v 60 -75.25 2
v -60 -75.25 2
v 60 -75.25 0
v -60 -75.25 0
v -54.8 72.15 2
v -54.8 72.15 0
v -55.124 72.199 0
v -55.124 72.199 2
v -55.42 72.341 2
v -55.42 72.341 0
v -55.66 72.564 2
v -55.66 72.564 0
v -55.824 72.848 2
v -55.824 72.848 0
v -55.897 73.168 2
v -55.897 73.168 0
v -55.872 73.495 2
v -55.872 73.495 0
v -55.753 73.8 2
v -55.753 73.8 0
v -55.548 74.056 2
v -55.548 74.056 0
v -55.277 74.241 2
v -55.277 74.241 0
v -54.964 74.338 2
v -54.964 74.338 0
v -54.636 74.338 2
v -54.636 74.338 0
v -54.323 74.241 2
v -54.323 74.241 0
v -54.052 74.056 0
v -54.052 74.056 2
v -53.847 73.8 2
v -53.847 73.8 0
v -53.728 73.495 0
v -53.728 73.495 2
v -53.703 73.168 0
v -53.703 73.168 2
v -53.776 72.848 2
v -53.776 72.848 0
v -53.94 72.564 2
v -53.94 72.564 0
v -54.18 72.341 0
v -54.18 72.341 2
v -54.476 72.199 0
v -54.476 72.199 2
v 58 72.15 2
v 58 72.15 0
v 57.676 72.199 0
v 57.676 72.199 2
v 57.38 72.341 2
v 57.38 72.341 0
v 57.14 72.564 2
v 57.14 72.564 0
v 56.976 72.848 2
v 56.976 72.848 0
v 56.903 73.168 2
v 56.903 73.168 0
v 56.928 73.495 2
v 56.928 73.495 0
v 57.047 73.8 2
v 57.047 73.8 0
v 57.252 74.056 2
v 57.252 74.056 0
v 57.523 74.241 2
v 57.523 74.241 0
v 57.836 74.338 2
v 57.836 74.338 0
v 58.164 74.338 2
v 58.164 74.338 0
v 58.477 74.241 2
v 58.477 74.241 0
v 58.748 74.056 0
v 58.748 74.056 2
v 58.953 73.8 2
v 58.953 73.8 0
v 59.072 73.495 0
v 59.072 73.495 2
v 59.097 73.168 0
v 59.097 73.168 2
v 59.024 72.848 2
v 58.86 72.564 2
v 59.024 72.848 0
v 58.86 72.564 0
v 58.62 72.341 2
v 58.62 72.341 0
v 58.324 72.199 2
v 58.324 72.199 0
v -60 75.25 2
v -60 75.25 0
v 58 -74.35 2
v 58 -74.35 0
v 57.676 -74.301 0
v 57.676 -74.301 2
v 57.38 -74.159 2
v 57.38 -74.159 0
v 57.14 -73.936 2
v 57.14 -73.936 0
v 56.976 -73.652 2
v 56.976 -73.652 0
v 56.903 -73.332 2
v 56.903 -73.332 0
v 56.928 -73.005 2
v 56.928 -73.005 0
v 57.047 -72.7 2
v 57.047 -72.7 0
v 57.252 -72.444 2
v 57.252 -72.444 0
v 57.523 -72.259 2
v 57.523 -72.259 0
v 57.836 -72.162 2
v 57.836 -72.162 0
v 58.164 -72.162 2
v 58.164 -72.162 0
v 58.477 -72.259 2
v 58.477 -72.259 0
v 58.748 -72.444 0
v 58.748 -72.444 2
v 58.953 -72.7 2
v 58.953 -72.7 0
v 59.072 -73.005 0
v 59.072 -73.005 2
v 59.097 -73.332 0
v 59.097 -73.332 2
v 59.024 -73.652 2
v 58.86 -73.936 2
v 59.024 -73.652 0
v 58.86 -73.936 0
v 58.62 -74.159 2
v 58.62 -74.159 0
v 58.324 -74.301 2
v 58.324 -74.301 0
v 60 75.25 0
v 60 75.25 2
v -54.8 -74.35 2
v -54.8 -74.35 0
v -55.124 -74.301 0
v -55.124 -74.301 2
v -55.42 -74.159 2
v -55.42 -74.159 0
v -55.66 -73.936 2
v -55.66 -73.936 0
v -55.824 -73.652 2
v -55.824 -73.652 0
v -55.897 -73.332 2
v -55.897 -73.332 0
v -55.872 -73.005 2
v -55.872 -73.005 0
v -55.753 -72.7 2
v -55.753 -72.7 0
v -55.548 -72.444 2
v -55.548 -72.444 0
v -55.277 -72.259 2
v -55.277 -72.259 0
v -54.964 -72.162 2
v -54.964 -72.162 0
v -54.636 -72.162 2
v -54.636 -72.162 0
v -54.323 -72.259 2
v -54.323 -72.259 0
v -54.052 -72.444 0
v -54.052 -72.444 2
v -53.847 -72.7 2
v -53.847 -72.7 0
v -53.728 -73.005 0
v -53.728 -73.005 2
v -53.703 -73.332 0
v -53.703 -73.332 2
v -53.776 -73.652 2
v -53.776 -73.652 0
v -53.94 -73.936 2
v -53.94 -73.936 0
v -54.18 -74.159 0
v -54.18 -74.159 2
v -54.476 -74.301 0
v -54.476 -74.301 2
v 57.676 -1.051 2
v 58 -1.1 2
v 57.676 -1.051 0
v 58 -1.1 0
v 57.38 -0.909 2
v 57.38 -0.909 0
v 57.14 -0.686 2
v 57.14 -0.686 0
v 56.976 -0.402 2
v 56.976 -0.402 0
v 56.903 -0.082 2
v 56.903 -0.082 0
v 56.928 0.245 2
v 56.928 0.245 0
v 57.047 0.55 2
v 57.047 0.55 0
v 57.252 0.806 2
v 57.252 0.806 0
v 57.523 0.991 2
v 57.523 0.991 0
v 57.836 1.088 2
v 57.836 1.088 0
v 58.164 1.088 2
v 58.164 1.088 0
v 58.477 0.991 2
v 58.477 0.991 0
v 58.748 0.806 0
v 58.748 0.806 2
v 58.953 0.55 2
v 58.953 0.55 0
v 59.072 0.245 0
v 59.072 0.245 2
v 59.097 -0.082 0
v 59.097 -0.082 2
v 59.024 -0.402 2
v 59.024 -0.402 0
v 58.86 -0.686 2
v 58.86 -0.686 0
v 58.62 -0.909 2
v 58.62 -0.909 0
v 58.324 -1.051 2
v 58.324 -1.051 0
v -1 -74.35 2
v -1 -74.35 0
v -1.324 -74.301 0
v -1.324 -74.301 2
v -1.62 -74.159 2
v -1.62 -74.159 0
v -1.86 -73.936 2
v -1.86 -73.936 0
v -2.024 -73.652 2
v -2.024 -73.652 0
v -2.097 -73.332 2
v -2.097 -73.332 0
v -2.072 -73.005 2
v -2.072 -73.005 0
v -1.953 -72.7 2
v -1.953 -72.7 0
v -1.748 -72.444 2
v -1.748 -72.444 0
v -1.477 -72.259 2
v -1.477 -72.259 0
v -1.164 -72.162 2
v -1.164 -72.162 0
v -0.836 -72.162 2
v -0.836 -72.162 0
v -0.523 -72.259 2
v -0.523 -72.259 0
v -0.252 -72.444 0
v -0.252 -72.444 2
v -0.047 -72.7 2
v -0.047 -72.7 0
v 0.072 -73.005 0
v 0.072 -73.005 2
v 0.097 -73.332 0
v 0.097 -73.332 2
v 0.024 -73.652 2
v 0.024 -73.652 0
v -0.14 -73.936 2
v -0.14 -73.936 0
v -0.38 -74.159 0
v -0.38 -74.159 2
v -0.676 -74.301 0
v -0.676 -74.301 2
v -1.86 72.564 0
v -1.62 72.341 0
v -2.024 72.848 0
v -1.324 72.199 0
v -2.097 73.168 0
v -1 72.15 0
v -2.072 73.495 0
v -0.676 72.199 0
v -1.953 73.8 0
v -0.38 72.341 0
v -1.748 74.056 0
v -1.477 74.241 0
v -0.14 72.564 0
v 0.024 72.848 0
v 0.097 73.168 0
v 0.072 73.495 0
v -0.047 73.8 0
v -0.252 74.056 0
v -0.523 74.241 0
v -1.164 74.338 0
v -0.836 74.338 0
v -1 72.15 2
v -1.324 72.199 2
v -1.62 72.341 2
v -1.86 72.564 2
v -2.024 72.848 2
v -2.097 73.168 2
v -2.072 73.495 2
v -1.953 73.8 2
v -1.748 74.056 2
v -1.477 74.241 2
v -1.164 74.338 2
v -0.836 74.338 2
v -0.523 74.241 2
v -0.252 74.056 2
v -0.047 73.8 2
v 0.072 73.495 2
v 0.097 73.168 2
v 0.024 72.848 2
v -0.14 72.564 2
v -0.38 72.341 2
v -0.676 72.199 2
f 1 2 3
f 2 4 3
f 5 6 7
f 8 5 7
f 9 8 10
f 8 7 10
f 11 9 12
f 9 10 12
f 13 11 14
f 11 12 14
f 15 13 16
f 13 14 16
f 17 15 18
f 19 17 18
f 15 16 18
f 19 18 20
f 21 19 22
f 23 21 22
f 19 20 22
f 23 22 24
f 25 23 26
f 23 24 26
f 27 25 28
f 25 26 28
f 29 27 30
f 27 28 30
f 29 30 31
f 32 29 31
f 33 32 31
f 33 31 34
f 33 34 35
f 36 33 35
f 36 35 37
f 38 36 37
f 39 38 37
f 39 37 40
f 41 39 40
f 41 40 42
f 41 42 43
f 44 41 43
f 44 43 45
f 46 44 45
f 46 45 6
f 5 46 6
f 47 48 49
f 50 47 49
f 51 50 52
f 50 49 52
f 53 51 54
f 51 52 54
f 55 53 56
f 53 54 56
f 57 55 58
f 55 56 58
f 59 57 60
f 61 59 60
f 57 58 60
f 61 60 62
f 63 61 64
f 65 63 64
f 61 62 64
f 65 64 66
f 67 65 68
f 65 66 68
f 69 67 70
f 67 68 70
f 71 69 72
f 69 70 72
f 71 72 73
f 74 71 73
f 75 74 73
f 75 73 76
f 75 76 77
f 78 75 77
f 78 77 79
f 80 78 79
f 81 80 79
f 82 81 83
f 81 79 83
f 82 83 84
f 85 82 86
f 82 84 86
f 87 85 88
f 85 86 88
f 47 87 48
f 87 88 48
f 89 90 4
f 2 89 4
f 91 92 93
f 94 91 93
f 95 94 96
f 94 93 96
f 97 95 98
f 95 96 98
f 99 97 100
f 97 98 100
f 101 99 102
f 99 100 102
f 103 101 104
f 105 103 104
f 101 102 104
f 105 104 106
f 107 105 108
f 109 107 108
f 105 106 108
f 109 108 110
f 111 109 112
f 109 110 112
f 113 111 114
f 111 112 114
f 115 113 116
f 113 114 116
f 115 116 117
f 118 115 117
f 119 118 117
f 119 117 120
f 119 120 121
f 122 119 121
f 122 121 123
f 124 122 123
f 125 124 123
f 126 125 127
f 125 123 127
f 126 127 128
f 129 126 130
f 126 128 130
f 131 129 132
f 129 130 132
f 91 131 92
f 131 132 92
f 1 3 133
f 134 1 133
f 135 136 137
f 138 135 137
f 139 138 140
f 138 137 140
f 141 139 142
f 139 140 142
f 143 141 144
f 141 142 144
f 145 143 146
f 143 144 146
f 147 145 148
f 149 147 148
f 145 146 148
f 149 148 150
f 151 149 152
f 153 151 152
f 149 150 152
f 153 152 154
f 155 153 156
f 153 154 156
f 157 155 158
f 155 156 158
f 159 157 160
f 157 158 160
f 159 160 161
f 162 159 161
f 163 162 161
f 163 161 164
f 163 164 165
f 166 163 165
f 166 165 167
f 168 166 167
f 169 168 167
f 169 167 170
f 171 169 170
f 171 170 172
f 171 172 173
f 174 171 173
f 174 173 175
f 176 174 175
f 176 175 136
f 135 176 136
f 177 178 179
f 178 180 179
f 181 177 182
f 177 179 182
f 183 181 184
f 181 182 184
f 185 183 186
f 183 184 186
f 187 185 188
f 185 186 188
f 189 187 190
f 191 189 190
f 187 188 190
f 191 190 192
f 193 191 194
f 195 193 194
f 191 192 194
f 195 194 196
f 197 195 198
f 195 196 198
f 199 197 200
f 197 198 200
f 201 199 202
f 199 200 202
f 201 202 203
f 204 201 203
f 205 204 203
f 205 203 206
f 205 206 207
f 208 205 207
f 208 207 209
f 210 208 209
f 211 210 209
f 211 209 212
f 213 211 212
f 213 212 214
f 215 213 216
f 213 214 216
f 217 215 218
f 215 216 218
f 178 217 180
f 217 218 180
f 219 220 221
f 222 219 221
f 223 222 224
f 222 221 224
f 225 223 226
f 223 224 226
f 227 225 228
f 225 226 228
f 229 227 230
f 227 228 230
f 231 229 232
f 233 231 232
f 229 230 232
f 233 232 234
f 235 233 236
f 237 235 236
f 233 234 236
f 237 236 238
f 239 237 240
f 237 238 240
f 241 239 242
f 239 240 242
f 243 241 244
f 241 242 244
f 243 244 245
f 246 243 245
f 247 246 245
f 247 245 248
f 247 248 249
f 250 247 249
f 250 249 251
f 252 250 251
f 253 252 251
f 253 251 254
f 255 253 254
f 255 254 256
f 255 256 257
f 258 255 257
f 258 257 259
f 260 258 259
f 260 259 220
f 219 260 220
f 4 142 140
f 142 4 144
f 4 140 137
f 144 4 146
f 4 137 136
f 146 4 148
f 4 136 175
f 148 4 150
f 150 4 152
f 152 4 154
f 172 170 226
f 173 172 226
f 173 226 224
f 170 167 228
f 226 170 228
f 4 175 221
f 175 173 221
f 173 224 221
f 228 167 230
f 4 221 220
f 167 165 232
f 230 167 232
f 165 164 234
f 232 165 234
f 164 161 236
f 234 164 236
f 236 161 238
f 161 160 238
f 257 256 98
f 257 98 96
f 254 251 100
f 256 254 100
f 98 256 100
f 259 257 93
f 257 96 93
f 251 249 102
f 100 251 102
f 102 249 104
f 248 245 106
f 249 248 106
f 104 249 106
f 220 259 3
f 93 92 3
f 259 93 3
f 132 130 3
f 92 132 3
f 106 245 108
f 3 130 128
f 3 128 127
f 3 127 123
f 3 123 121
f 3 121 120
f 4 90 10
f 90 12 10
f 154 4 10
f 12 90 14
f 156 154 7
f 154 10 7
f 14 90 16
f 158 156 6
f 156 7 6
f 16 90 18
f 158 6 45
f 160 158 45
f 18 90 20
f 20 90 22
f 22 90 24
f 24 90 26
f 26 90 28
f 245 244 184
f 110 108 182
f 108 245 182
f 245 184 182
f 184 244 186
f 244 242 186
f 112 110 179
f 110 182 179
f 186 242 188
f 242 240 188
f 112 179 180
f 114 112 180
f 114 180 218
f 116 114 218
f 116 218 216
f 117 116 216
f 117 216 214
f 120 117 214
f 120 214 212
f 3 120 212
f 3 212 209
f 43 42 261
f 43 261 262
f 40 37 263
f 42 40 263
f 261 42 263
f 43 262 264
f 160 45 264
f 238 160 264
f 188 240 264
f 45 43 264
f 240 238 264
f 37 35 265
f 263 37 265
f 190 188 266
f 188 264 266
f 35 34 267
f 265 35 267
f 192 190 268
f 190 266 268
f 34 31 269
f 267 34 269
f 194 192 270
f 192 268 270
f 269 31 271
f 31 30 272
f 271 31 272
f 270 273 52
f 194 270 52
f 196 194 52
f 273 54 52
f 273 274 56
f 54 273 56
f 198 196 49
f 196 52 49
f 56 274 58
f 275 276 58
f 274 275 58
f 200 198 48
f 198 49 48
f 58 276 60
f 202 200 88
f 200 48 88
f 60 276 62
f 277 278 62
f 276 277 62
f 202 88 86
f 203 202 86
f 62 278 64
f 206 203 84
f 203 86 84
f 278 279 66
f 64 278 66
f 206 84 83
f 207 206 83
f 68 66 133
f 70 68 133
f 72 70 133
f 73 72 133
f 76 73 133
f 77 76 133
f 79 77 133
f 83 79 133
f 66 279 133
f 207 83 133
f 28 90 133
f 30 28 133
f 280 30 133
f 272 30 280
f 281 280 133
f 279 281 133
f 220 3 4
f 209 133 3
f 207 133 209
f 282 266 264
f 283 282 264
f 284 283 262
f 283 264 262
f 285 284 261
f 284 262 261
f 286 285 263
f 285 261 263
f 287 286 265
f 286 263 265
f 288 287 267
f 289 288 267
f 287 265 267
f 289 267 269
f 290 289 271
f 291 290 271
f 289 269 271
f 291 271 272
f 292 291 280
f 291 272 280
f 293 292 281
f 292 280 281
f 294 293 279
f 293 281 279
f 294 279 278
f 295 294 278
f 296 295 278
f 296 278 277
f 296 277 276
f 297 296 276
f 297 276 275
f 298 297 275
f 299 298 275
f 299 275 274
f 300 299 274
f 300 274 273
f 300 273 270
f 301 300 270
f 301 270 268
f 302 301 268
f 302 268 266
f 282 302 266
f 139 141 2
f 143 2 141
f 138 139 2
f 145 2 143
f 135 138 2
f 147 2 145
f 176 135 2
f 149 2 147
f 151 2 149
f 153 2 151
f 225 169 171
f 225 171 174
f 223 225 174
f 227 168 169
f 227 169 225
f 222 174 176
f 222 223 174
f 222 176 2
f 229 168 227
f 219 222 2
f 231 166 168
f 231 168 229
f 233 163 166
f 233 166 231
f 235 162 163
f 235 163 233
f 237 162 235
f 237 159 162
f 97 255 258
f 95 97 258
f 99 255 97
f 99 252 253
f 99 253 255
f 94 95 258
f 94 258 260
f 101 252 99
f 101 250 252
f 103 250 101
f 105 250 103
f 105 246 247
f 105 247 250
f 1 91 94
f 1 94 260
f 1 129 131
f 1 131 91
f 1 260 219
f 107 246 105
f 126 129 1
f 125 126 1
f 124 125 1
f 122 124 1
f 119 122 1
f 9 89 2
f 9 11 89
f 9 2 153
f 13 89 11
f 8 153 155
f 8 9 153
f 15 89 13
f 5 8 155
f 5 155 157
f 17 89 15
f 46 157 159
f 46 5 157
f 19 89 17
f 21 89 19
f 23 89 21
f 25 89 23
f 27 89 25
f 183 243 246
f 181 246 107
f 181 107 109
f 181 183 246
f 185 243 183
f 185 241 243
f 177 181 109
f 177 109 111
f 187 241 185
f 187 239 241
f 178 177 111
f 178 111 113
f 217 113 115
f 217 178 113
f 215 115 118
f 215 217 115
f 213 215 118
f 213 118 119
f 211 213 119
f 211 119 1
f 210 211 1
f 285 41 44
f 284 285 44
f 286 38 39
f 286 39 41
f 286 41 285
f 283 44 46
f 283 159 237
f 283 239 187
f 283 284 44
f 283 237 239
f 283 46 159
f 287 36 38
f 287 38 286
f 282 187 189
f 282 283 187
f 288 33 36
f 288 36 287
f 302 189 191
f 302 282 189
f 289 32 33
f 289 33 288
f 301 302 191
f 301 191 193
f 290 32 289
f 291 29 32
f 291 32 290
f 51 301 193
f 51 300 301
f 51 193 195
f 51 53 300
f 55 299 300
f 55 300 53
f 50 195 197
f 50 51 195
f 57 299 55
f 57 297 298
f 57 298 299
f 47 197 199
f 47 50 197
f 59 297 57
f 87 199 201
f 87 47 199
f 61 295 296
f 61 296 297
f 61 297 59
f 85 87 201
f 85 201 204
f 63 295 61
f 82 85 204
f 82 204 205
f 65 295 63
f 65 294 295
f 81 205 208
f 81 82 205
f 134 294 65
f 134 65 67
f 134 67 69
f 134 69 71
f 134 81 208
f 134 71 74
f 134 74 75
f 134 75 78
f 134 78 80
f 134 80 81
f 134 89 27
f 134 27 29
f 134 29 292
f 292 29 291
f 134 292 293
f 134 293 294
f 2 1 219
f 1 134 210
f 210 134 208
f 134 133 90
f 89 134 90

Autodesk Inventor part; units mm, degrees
ref_plane "YZ Plane" through (0, 0, 0) normal (1, 0, 0) x (0, 1, 0)
ref_plane "XZ Plane" through (0, 0, 0) normal (0, 1, 0) x (-1, 0, 0)
ref_plane "XY Plane" through (0, 0, 0) normal (0, 0, 1) x (1, 0, 0)
ref_plane "Work Plane1" through (0, 0, 0) normal (0, 0, 1) x (1, 0, 0)
sketch "Sketch1" plane through (0, 0, 0) normal (0, 0, 1) x (1, 0, 0)
  circle A0 centre (-1, 73.25) radius 1.05 projected
  circle A1 centre (-54.8, -73.25) radius 1.05 projected
  circle A2 centre (-54.8, 73.25) radius 1.05 projected
  circle A3 centre (-1, -73.25) radius 1.05 projected
  circle A4 centre (58, -73.25) radius 1.05 projected
  circle A5 centre (58, 0) radius 1.05 projected
  circle A6 centre (58, 73.25) radius 1.05 projected
  line L0 (-60, -75.25) -> (60, -75.25) projected
  line L1 (60, -75.25) -> (60, 75.25) projected
  line L2 (60, 75.25) -> (-60, 75.25) projected
  line L3 (-60, 75.25) -> (-60, 73.25) projected
  line L4 (-60, 73.25) -> (-56.8, 73.25) projected
  line L5 (-56.8, 71.25) -> (-56.8, 73.25) projected
  line L6 (-54.8, 71.25) -> (-56.8, 71.25) projected
  arc A7 (-54.8, 71.25) -> (-52.8, 73.25) centre (-54.8, 73.25) ccw projected
  line L7 (-52.8, 73.25) -> (-3, 73.25) projected
  arc A8 (-3, 73.25) -> (1, 73.25) centre (-1, 73.25) ccw projected
  line L8 (1, 73.25) -> (56, 73.25) projected
  arc A9 (56, 73.25) -> (58, 71.25) centre (58, 73.25) ccw projected
  line L9 (58, 71.25) -> (58, 2) projected
  arc A10 (58, 2) -> (58, -2) centre (58, 0) ccw projected
  line L10 (58, -2) -> (58, -71.25) projected
  arc A11 (58, -71.25) -> (56, -73.25) centre (58, -73.25) ccw projected
  line L11 (56, -73.25) -> (1, -73.25) projected
  arc A12 (1, -73.25) -> (-3, -73.25) centre (-1, -73.25) ccw projected
  line L12 (-3, -73.25) -> (-52.8, -73.25) projected
  arc A13 (-52.8, -73.25) -> (-54.8, -71.25) centre (-54.8, -73.25) ccw projected
  line L13 (-56.8, -71.25) -> (-54.8, -71.25) projected
  line L14 (-56.8, -73.25) -> (-56.8, -71.25) projected
  line L15 (-56.8, -73.25) -> (-60, -73.25) projected
  line L16 (-60, -73.25) -> (-60, -75.25) projected
  line L17 (-56.8, -73.25) -> (-56.8, 73.25) projected
  line L18 (-56.8, 73.25) -> (-59.8, 73.25) projected
  line L19 (-59.8, -73.25) -> (-59.8, 73.25) projected
  line L20 (-56.8, -73.25) -> (-59.8, -73.25) projected
  line L21 (60, 75.25) -> (-60, 75.25)
  line L22 (-60, 75.25) -> (-60, -75.25)
  line L23 (-60, -75.25) -> (60, -75.25)
  line L24 (60, -75.25) -> (60, 75.25)
  point P0 (0, 0)
extrude "Extrusion1" add sketch "Sketch1" along normal blind 2 contours A0 | A1 | A2 | A3 | A4 | A5 | A6 | L16 L15 L14 L13 A13 L12 A12 L11 A11 L10 A10 L9 A9 L8 A8 L7 A7 L6 L5 L4 L3 L2 L1 L0 | L22 L4 L19 L15 | L19 L4 L5 L17 L14 L15 | L17 L6 A7 L7 A8 L8 A9 L9 A10 L10 A11 L11 A12 L12 A13 L13
hole "Hole1" at (58, 73.25, 2) at (58, 0, 2) at (58, -73.25, 2) at (-1, -73.25, 2) at (-54.8, -73.25, 2) at (-54.8, 73.25, 2) at (-1, 73.25, 2) direction (0, 0, -1) diameter 2.2 depth 2
properties part number "controller-top"
